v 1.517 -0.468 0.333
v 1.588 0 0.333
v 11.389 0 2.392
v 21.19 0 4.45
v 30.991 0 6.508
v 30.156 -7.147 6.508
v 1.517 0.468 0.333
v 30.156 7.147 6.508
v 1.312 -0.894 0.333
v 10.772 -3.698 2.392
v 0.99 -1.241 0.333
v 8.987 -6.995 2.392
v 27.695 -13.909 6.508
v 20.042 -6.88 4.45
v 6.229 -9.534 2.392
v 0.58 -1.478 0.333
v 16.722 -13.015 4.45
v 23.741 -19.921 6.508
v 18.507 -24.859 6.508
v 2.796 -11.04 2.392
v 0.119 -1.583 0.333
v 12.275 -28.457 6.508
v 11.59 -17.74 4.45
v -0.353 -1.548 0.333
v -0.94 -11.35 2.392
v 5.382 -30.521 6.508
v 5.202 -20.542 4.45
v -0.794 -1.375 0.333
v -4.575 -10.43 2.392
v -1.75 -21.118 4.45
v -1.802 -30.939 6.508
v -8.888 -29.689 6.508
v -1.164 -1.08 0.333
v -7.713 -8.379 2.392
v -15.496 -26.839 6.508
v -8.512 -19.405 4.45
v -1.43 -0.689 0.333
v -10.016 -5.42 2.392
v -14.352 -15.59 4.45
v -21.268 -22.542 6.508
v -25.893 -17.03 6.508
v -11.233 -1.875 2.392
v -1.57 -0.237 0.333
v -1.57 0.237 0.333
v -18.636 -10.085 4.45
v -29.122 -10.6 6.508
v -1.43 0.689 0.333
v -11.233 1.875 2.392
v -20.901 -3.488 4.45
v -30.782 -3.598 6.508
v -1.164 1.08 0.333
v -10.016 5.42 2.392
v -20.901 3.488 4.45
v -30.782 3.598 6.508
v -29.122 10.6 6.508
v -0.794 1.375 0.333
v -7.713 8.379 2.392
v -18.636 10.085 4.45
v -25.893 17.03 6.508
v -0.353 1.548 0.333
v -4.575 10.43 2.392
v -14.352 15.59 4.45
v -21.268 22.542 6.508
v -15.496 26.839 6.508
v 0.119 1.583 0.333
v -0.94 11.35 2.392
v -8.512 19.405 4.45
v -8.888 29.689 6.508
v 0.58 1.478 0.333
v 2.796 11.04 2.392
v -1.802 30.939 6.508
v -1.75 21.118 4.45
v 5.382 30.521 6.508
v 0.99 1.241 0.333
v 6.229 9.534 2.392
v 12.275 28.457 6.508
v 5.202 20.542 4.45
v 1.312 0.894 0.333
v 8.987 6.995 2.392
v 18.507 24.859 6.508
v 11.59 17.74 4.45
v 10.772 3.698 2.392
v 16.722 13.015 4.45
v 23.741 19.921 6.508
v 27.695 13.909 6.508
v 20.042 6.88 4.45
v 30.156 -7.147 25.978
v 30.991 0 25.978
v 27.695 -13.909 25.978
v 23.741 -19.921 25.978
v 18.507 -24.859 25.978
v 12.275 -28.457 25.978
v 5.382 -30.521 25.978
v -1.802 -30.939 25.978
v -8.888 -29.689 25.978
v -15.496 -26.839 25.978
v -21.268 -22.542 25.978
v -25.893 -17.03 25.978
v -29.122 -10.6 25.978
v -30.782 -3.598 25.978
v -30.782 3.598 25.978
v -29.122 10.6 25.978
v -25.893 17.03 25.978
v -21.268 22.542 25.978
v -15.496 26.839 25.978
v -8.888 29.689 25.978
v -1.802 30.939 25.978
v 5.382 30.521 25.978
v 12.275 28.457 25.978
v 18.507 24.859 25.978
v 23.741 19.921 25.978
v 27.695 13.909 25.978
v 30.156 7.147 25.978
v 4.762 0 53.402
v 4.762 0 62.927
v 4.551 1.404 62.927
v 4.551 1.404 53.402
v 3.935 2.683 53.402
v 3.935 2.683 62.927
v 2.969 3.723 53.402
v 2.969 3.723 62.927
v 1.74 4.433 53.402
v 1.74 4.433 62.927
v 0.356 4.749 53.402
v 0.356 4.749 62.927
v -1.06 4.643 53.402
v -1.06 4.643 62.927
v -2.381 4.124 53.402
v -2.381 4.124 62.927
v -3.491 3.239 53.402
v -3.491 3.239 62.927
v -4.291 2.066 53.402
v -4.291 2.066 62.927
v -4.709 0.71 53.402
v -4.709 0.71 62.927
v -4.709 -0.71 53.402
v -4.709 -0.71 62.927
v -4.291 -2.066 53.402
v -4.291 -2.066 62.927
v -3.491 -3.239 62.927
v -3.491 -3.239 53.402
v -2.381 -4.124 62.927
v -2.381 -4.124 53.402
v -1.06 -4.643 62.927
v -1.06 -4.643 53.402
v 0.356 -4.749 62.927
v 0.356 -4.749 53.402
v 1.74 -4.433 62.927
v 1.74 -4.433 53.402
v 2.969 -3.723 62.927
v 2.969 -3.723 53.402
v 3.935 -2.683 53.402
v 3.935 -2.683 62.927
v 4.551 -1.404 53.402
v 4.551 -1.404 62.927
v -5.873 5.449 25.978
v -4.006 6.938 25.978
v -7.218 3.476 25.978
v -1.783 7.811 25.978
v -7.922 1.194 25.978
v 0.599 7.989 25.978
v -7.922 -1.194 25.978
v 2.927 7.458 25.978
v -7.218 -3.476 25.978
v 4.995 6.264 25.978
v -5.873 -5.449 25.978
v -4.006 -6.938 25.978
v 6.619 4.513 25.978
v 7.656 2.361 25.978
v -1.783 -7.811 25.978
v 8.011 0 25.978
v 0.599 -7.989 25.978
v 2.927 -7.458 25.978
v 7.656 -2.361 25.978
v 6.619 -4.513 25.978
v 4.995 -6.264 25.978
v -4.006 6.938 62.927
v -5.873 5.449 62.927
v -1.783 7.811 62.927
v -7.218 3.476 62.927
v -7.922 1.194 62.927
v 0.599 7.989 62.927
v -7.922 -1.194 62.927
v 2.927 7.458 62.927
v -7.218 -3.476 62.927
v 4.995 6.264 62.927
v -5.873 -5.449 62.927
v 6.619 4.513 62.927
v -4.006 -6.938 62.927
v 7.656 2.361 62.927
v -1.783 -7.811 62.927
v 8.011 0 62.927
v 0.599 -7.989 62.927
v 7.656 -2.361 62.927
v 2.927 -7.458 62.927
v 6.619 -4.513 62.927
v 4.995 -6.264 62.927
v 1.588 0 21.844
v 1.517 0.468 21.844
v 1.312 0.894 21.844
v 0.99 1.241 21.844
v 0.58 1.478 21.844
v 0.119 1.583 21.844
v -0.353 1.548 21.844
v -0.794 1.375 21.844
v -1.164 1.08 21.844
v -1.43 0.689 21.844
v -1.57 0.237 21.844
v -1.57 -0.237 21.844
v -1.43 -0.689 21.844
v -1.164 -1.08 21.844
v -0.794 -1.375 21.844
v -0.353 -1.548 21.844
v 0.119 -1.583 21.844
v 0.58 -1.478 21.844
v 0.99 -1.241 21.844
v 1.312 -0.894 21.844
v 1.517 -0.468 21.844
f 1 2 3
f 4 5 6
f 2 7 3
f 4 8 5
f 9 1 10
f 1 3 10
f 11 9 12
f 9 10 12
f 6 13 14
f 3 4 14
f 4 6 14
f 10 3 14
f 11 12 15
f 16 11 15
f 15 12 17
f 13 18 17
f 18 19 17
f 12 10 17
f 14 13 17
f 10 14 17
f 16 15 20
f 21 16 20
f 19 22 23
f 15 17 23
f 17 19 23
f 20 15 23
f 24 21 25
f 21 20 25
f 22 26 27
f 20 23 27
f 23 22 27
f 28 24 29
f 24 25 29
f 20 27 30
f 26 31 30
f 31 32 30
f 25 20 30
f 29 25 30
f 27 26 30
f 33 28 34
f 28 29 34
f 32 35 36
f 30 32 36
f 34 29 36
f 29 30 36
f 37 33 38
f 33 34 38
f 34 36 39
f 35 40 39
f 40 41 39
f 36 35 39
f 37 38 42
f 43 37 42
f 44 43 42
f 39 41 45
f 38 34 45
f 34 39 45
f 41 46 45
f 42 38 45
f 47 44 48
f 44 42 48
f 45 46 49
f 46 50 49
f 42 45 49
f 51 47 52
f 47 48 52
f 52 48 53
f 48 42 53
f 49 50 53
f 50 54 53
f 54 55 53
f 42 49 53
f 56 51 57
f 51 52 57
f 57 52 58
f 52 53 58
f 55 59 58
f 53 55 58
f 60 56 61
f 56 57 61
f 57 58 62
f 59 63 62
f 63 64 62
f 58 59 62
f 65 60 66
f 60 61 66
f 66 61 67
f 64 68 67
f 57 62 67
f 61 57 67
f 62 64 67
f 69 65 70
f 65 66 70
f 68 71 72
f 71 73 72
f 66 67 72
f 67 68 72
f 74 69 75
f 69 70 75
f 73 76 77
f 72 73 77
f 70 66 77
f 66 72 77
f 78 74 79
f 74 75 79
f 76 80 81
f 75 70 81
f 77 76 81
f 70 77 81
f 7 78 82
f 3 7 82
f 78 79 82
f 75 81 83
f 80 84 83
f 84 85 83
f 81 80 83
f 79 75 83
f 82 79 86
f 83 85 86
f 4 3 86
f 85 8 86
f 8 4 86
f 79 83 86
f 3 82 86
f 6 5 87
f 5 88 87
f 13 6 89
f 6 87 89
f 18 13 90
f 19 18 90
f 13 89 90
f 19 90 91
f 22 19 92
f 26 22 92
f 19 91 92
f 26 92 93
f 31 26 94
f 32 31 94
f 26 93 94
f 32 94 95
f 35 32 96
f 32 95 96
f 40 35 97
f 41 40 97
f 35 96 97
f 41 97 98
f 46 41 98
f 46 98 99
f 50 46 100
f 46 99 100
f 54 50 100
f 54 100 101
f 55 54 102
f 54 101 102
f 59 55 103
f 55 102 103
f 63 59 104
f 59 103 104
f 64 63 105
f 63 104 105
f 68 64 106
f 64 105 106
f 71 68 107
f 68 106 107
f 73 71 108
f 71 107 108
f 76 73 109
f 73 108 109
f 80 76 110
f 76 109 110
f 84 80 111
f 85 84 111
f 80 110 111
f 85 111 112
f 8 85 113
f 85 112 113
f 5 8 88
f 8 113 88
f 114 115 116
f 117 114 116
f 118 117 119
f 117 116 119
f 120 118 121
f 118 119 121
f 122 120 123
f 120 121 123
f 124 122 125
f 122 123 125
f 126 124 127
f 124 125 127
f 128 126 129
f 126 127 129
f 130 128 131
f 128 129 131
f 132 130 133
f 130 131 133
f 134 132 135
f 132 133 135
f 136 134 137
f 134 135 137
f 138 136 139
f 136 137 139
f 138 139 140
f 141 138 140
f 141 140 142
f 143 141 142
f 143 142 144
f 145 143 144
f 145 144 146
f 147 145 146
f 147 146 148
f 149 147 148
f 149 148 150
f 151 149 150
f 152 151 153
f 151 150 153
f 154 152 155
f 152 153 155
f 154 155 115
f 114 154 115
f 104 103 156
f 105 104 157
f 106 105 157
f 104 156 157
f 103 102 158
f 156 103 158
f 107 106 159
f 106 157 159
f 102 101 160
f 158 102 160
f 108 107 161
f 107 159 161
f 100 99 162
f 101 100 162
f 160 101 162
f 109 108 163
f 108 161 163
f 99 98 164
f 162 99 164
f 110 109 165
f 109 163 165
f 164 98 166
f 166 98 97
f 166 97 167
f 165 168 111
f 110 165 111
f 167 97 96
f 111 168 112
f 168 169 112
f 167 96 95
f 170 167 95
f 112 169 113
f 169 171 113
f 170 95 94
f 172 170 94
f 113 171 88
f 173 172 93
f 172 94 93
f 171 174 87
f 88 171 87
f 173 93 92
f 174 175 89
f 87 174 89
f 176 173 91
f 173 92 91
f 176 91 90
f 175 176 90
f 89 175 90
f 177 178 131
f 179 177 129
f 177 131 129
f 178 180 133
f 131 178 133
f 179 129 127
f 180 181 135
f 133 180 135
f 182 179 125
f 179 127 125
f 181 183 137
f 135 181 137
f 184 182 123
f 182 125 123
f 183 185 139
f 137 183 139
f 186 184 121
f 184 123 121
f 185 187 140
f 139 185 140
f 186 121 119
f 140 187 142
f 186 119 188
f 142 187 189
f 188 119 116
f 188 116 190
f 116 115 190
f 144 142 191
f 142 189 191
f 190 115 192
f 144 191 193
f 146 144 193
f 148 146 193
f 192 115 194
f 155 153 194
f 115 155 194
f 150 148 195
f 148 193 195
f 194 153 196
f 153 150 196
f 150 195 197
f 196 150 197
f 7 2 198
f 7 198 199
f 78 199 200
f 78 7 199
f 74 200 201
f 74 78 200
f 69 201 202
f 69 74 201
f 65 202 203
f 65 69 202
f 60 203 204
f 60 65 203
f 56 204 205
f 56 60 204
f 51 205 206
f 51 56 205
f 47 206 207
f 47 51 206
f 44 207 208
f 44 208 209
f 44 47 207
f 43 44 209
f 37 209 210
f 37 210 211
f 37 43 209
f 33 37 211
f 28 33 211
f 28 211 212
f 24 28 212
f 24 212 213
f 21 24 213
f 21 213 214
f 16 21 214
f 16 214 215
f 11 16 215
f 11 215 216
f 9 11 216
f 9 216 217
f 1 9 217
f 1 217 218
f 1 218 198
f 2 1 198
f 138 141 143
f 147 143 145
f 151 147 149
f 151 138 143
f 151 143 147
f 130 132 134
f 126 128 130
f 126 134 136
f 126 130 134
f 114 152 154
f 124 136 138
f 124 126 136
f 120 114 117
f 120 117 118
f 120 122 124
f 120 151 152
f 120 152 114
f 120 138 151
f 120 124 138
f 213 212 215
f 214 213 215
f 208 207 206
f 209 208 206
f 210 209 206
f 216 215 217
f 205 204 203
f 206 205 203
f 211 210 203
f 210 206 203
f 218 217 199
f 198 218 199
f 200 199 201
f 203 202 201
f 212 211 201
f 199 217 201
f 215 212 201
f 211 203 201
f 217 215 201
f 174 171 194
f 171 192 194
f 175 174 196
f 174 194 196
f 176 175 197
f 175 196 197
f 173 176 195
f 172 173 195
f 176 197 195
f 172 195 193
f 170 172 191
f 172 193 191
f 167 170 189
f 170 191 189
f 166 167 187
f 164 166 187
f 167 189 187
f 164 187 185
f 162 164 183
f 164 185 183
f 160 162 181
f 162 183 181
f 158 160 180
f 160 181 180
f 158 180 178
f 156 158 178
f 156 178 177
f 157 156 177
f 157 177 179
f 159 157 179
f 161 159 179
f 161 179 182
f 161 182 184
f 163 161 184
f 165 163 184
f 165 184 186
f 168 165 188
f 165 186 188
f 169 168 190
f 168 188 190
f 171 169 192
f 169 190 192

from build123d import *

# Parameters (mm, degrees)
F2_R     = 4.7625
F3_DEPTH = 9.525
F4_R     = 1.5875
F5_DEPTH = 21.844


with BuildPart() as f1:
    # F0 (on Front) → F1 (revolve)
    with BuildSketch(Plane.XZ):
        Polygon((0, 62.927276), (0, 0), (30.991441, 6.508361), (30.991441, 25.977967), (8.01147, 25.977967), (8.01147, 62.927276), align=None)
    revolve(axis=Axis((0, 0, 31.463638), (0, 0, -1)))

    # F2 (on face) → F3 (cut)
    with BuildSketch(Plane.XY.offset(62.927276)):
        Circle(F2_R)
    extrude(amount=-F3_DEPTH, mode=Mode.SUBTRACT)

    # F4 (on Top) → F5 (cut)
    with BuildSketch(Plane.XY):
        Circle(F4_R)
    extrude(amount=F5_DEPTH, mode=Mode.SUBTRACT)


solid = f1.part
